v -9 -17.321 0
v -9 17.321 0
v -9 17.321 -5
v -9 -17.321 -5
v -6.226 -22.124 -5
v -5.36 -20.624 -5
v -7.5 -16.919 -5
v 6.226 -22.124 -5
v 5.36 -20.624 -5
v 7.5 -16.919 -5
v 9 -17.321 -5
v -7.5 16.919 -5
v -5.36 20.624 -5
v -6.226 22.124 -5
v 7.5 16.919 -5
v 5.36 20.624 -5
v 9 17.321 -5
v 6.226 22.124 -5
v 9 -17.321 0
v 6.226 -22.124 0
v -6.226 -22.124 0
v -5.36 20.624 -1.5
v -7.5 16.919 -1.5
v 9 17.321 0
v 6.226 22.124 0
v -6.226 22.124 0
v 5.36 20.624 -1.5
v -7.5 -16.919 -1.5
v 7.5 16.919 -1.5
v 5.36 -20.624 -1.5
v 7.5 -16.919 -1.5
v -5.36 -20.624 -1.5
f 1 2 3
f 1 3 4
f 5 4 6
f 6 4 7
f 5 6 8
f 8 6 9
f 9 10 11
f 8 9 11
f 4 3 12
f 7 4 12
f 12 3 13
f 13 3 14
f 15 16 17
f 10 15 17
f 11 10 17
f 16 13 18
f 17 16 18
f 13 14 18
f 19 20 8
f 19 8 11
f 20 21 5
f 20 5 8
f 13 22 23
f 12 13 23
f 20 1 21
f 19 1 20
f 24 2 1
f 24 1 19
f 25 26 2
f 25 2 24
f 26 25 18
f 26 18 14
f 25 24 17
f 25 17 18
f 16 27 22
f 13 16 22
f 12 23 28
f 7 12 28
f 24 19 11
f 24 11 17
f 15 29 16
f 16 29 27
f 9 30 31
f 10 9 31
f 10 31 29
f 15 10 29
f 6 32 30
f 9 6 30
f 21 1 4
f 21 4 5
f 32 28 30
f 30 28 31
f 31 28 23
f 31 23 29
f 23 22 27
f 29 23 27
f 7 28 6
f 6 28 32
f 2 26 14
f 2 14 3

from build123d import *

# Parameters (mm, degrees)
BOSS_EXTRUDE1_DEPTH = 5
SHELL1_T            = -1.5


with BuildPart() as part:
    # Sketch1 → Boss-Extrude1 (new body)
    with BuildSketch(Plane.XY):
        Polygon((6.226497308, -22.124355653), (9, -17.320508076), (9, 17.320508076), (6.226497308, 22.124355653), (-6.226497308, 22.124355653), (-9, 17.320508076), (-9, -17.320508076), (-6.226497308, -22.124355653), align=None)
    extrude(amount=-BOSS_EXTRUDE1_DEPTH)

    # Shell1
    shell1_openings = [part.faces().sort_by_distance(p)[0] for p in [
        (0, 0, -5),
    ]]
    offset(amount=SHELL1_T, openings=shell1_openings, kind=Kind.INTERSECTION)


solid = part.part
